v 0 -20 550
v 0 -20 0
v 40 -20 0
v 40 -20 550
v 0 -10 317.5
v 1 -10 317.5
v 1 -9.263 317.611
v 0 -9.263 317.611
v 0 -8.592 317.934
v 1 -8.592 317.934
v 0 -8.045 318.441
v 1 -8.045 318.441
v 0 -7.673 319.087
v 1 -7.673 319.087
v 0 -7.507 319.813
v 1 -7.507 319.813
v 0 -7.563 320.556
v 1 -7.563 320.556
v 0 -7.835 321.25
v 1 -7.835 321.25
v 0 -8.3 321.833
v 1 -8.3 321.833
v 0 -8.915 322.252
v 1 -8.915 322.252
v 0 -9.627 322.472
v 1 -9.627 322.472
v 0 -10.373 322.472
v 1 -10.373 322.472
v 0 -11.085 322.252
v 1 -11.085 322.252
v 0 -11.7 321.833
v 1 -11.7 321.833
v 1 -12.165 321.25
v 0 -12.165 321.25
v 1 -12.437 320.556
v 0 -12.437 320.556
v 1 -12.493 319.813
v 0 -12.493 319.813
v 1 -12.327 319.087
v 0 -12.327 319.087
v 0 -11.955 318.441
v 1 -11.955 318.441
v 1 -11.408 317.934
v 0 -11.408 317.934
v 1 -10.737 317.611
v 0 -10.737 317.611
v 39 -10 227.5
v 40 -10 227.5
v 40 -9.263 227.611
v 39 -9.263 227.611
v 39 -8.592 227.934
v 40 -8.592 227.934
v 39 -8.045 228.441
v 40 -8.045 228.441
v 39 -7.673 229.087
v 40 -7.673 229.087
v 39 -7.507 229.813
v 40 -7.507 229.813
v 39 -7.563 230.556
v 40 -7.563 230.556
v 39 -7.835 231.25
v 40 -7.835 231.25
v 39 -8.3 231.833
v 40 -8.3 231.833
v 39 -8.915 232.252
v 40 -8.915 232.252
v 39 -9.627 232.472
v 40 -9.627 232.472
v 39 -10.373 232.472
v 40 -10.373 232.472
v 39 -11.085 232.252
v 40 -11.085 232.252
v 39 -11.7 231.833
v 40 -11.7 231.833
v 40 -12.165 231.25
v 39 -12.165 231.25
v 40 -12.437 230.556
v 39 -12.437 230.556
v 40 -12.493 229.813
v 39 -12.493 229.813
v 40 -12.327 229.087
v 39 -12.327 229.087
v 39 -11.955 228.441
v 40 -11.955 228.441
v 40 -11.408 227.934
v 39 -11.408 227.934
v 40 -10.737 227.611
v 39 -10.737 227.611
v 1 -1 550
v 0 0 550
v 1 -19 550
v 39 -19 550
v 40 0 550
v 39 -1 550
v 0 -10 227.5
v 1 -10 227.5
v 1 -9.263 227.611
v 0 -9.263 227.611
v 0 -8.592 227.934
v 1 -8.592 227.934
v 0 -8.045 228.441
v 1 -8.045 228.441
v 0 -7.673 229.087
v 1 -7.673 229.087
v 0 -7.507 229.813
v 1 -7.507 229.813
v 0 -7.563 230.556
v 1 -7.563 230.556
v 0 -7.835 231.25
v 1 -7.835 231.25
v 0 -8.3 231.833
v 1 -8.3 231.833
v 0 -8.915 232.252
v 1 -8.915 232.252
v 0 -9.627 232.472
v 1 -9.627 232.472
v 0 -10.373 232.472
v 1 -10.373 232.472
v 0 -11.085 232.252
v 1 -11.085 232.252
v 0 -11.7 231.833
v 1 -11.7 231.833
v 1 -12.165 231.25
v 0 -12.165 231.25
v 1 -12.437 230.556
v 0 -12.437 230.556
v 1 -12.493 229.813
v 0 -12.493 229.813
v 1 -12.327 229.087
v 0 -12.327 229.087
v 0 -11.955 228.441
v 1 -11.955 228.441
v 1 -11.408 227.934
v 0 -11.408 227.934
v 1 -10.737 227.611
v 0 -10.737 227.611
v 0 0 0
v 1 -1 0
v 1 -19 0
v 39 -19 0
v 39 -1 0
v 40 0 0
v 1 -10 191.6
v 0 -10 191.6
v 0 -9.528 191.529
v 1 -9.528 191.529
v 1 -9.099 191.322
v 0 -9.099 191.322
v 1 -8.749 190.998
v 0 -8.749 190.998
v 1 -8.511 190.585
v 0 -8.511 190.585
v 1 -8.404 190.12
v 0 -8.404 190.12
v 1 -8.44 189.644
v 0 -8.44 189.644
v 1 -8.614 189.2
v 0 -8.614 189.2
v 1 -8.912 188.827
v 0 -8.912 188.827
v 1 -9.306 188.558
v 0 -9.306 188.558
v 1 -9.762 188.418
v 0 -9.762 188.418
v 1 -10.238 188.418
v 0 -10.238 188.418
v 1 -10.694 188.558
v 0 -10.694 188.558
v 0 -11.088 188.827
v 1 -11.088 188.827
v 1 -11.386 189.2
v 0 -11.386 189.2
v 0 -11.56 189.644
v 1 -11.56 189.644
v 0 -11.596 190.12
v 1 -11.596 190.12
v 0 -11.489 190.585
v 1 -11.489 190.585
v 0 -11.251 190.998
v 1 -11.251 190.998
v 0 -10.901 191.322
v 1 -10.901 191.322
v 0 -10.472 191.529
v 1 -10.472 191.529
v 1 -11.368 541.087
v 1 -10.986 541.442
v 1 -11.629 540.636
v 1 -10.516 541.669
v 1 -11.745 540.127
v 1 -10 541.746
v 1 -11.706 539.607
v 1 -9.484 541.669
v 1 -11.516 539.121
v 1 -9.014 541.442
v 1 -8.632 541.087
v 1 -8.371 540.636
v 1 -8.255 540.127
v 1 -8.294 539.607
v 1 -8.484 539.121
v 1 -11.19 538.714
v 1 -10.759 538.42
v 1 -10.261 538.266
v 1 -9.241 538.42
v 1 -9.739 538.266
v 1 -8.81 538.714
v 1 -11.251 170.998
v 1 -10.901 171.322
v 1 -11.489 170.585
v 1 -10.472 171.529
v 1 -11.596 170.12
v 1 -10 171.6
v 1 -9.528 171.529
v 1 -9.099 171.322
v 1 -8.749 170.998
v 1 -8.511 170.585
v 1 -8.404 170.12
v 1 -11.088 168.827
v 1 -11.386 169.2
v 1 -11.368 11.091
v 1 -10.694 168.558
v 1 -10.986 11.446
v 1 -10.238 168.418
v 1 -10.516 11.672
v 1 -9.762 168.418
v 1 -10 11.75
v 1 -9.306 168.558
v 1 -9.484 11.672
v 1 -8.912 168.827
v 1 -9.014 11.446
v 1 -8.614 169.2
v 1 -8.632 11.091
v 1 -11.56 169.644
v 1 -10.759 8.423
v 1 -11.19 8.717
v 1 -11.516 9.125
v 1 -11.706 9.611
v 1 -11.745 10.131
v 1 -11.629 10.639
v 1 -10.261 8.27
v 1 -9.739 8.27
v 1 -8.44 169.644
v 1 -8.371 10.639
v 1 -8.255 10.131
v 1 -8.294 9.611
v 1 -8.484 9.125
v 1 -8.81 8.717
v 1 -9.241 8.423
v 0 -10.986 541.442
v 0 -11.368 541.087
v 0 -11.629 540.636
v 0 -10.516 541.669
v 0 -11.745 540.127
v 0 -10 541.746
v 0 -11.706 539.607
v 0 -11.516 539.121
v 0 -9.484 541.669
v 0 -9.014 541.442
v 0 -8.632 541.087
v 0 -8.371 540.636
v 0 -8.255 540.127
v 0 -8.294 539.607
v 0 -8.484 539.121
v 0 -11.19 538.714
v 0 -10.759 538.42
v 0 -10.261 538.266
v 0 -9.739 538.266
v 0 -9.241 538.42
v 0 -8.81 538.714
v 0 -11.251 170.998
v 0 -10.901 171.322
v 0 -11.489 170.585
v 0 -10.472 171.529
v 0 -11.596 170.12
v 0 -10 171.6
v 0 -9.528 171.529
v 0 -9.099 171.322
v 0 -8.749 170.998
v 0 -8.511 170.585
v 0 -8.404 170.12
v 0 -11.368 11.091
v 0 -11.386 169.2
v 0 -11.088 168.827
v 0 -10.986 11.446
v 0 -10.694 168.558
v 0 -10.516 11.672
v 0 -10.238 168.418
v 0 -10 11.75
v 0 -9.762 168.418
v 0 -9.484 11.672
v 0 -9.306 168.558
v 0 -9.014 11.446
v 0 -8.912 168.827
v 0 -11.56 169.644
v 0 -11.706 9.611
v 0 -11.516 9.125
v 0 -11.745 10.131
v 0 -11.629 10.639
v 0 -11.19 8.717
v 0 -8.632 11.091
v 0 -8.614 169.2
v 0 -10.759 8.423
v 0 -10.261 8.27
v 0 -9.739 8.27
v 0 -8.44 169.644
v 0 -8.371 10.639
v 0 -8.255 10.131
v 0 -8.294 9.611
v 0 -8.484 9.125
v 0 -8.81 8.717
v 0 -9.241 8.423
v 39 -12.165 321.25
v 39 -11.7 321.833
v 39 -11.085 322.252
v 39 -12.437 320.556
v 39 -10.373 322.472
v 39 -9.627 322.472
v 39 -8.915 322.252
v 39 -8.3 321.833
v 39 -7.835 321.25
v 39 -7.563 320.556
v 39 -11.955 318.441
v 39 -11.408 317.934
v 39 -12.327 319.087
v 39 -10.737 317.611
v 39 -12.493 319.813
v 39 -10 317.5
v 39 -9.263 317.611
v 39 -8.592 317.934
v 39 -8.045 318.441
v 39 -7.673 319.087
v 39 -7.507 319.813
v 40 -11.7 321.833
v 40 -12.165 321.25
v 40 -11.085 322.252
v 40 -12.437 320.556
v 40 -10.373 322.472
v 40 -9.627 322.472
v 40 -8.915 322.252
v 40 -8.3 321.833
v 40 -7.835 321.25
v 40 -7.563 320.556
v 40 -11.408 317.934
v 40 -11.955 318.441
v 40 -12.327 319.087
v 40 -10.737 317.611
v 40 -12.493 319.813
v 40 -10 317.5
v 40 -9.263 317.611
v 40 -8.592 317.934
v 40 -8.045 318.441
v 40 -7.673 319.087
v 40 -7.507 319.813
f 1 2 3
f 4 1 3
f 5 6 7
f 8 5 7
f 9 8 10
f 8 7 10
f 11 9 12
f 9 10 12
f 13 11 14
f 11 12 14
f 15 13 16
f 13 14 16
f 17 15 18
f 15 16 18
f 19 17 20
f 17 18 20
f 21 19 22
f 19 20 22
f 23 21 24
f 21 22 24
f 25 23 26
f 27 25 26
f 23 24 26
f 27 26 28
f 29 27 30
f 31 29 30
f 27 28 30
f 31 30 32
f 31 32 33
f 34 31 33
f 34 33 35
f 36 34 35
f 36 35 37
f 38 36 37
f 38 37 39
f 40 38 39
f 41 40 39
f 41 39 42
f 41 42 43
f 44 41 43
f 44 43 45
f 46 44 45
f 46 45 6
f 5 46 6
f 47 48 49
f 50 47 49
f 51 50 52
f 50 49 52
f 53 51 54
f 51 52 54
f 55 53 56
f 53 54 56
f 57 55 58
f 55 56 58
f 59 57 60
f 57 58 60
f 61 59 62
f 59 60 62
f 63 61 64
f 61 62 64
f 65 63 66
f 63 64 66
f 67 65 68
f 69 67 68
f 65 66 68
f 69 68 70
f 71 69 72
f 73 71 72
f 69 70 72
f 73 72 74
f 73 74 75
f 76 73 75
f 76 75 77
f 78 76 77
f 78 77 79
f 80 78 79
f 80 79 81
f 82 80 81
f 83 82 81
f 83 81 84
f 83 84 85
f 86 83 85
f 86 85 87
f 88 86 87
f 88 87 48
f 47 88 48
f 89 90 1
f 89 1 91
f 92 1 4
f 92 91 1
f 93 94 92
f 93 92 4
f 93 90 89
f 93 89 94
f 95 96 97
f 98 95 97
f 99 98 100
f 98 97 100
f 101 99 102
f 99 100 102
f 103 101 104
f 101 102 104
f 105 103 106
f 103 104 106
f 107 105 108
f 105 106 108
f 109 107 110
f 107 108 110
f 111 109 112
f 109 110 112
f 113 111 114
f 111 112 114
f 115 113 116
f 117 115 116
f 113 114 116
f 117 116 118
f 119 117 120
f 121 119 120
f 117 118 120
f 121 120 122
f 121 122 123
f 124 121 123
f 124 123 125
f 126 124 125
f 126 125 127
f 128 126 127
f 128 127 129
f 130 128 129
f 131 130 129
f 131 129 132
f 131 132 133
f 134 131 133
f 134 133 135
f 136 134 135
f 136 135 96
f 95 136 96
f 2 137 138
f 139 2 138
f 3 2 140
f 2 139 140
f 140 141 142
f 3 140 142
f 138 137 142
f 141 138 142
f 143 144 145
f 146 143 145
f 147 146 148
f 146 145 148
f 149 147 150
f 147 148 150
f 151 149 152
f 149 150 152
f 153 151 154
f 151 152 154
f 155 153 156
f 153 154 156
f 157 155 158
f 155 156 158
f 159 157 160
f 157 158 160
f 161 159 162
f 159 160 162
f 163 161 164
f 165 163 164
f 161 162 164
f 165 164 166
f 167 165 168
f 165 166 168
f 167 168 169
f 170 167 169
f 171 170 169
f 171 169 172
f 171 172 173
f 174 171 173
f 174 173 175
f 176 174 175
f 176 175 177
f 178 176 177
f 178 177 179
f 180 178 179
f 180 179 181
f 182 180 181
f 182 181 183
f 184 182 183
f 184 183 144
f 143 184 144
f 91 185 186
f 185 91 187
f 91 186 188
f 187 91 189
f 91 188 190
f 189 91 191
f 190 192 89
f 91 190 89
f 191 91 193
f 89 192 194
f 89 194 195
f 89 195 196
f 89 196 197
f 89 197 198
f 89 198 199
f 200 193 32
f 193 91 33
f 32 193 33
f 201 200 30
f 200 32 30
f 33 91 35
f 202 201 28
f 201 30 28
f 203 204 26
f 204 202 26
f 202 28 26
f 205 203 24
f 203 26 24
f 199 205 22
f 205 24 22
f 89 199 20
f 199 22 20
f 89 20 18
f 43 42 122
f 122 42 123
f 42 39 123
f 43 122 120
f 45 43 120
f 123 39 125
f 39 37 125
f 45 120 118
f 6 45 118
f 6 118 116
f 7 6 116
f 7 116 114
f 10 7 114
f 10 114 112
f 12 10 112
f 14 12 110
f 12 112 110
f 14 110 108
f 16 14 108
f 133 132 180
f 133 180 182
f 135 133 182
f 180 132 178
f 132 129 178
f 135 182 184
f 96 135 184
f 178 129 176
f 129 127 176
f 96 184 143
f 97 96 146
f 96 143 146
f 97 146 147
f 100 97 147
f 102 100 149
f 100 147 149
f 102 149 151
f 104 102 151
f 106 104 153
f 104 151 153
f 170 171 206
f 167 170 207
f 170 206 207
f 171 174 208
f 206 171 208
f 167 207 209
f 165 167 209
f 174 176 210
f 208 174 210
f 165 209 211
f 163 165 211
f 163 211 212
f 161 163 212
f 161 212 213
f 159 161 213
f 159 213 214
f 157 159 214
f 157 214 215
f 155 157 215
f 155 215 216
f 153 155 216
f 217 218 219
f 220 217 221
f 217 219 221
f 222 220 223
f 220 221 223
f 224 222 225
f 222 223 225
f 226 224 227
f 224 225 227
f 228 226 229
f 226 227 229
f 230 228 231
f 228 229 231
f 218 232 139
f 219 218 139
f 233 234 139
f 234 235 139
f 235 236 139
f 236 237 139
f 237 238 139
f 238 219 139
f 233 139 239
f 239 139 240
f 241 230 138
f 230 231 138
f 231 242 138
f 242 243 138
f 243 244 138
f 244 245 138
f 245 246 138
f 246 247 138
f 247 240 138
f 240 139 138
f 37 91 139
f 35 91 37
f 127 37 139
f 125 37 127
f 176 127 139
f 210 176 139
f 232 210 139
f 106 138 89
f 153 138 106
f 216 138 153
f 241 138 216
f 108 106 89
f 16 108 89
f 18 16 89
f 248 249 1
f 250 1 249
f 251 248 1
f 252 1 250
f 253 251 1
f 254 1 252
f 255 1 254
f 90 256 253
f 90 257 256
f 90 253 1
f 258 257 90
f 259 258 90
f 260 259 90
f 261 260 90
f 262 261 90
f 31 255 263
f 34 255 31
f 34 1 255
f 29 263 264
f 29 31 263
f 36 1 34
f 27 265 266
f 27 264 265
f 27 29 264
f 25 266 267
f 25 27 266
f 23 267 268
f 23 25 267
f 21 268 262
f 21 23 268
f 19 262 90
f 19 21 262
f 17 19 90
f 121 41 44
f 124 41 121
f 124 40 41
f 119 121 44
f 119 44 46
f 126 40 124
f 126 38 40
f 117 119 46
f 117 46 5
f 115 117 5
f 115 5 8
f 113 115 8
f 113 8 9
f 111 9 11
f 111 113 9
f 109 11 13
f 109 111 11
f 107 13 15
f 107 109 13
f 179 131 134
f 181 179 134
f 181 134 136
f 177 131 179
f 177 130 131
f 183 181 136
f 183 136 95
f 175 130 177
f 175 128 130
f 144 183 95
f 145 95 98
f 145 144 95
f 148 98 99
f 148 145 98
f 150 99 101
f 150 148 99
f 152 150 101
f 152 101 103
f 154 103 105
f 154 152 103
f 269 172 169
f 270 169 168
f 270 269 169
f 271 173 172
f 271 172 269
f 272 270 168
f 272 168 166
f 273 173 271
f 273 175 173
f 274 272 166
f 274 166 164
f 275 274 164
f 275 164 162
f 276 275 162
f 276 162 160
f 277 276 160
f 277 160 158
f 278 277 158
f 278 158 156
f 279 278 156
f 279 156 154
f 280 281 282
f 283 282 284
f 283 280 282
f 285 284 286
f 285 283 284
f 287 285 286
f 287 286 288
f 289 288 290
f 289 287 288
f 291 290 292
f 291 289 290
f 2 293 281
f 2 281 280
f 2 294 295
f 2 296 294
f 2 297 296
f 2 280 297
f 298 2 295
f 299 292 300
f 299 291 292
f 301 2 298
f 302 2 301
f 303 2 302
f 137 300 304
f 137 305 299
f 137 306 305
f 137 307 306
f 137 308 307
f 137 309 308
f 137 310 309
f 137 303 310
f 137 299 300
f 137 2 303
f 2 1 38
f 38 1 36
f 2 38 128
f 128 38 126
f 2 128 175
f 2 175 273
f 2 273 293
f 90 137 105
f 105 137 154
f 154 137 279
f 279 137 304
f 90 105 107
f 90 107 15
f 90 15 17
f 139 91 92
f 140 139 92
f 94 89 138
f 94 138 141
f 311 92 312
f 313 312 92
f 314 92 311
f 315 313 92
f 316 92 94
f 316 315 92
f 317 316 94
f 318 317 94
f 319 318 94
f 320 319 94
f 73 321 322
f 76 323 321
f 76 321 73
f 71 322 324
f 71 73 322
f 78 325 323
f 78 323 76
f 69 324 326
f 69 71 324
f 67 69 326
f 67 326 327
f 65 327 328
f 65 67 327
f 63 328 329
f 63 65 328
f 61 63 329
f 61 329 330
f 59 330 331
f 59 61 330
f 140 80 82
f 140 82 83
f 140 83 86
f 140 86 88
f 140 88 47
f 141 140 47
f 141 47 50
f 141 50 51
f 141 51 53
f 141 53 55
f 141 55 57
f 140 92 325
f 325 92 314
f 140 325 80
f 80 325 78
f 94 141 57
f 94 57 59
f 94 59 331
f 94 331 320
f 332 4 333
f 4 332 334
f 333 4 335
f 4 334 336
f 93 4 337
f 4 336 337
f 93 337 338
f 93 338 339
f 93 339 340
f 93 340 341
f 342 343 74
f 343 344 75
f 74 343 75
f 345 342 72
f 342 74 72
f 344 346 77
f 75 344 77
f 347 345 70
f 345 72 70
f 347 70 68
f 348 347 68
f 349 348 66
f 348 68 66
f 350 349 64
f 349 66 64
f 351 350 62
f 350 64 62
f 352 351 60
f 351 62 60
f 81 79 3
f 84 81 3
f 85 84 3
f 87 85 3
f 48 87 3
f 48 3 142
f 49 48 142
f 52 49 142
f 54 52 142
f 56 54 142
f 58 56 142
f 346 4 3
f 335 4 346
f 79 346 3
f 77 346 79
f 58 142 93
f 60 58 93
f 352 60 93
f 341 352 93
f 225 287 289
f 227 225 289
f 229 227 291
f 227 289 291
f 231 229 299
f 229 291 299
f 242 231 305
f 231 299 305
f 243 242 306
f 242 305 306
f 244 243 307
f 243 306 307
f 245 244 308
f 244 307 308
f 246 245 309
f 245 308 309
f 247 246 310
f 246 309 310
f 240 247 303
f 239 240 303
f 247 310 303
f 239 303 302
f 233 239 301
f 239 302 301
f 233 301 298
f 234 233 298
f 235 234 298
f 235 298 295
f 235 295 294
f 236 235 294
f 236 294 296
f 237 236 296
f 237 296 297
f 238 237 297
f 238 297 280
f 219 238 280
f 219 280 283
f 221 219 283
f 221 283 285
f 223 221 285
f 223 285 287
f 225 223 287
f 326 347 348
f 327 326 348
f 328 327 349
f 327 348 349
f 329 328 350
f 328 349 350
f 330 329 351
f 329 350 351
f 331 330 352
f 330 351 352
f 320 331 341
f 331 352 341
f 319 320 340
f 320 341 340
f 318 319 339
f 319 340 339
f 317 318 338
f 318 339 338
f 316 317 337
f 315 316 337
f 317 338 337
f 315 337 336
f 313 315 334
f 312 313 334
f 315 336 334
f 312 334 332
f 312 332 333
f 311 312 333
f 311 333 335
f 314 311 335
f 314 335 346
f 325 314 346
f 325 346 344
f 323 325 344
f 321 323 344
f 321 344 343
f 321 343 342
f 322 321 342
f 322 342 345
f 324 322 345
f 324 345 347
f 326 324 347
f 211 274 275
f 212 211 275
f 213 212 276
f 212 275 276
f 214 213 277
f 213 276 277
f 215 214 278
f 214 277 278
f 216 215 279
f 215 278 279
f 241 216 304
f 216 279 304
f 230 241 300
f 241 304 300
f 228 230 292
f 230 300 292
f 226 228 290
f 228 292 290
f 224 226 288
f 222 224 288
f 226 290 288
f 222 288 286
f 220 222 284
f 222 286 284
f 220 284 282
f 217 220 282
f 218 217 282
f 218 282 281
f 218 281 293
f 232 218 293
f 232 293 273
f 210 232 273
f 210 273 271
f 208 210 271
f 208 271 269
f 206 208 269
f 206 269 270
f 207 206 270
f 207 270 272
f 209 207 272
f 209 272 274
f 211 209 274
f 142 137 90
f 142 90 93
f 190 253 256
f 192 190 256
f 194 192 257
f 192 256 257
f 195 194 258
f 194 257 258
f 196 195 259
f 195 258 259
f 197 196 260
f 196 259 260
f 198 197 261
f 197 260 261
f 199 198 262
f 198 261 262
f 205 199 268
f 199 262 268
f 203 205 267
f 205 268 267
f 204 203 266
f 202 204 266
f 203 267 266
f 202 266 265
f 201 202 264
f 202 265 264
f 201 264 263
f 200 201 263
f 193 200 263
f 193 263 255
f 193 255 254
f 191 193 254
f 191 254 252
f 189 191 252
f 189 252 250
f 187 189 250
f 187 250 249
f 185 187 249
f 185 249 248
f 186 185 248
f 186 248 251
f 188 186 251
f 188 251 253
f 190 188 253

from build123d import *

# Parameters (mm, degrees)
SKETCH_1_W          = 40
SKETCH_1_H          = 20
SKETCH_1_W_2        = 38
SKETCH_1_H_2        = 18
EXTRUDE_1_DEPTH     = 550
SKETCH_4_R          = 1.75
CUT_EXTRUDE_2_DEPTH = 1.5
SKETCH_6_R          = 2.5
CUT_EXTRUDE_3_DEPTH = 552.815186453
SKETCH_7_R          = 1.6
CUT_EXTRUDE_4_DEPTH = 10


with BuildPart() as part:
    # 草图1 → 拉伸-薄壁1 (new body)
    with BuildSketch(Plane.XY):
        with Locations((20, -10)):
            Rectangle(SKETCH_1_W, SKETCH_1_H)
        with Locations((20, -10)):
            Rectangle(SKETCH_1_W_2, SKETCH_1_H_2, mode=Mode.SUBTRACT)
    extrude(amount=EXTRUDE_1_DEPTH)

    # 草图4 → 切除-拉伸2 (cut)
    with BuildSketch(Plane.ZY):
        with Locations((539.996387591, -10)):
            Circle(SKETCH_4_R)
        with Locations((10, -10.000000002)):
            Circle(SKETCH_4_R)
    extrude(amount=-CUT_EXTRUDE_2_DEPTH, mode=Mode.SUBTRACT)

    # 草图6 → 切除-拉伸3 (cut, through all)
    with BuildSketch(Plane(origin=(40, 0, 0), x_dir=(0, 0, -1), z_dir=(1, 0, 0))):
        with Locations((-320, -10)):
            Circle(SKETCH_6_R)
        with Locations((-230, -10)):
            Circle(SKETCH_6_R)
    extrude(amount=-CUT_EXTRUDE_3_DEPTH, mode=Mode.SUBTRACT)

    # 草图7 → 切除-拉伸4 (cut)
    with BuildSketch(Plane.ZY):
        with Locations((190, -10)):
            Circle(SKETCH_7_R)
        with Locations((170, -10)):
            Circle(SKETCH_7_R)
    extrude(amount=-CUT_EXTRUDE_4_DEPTH, mode=Mode.SUBTRACT)


solid = part.part
